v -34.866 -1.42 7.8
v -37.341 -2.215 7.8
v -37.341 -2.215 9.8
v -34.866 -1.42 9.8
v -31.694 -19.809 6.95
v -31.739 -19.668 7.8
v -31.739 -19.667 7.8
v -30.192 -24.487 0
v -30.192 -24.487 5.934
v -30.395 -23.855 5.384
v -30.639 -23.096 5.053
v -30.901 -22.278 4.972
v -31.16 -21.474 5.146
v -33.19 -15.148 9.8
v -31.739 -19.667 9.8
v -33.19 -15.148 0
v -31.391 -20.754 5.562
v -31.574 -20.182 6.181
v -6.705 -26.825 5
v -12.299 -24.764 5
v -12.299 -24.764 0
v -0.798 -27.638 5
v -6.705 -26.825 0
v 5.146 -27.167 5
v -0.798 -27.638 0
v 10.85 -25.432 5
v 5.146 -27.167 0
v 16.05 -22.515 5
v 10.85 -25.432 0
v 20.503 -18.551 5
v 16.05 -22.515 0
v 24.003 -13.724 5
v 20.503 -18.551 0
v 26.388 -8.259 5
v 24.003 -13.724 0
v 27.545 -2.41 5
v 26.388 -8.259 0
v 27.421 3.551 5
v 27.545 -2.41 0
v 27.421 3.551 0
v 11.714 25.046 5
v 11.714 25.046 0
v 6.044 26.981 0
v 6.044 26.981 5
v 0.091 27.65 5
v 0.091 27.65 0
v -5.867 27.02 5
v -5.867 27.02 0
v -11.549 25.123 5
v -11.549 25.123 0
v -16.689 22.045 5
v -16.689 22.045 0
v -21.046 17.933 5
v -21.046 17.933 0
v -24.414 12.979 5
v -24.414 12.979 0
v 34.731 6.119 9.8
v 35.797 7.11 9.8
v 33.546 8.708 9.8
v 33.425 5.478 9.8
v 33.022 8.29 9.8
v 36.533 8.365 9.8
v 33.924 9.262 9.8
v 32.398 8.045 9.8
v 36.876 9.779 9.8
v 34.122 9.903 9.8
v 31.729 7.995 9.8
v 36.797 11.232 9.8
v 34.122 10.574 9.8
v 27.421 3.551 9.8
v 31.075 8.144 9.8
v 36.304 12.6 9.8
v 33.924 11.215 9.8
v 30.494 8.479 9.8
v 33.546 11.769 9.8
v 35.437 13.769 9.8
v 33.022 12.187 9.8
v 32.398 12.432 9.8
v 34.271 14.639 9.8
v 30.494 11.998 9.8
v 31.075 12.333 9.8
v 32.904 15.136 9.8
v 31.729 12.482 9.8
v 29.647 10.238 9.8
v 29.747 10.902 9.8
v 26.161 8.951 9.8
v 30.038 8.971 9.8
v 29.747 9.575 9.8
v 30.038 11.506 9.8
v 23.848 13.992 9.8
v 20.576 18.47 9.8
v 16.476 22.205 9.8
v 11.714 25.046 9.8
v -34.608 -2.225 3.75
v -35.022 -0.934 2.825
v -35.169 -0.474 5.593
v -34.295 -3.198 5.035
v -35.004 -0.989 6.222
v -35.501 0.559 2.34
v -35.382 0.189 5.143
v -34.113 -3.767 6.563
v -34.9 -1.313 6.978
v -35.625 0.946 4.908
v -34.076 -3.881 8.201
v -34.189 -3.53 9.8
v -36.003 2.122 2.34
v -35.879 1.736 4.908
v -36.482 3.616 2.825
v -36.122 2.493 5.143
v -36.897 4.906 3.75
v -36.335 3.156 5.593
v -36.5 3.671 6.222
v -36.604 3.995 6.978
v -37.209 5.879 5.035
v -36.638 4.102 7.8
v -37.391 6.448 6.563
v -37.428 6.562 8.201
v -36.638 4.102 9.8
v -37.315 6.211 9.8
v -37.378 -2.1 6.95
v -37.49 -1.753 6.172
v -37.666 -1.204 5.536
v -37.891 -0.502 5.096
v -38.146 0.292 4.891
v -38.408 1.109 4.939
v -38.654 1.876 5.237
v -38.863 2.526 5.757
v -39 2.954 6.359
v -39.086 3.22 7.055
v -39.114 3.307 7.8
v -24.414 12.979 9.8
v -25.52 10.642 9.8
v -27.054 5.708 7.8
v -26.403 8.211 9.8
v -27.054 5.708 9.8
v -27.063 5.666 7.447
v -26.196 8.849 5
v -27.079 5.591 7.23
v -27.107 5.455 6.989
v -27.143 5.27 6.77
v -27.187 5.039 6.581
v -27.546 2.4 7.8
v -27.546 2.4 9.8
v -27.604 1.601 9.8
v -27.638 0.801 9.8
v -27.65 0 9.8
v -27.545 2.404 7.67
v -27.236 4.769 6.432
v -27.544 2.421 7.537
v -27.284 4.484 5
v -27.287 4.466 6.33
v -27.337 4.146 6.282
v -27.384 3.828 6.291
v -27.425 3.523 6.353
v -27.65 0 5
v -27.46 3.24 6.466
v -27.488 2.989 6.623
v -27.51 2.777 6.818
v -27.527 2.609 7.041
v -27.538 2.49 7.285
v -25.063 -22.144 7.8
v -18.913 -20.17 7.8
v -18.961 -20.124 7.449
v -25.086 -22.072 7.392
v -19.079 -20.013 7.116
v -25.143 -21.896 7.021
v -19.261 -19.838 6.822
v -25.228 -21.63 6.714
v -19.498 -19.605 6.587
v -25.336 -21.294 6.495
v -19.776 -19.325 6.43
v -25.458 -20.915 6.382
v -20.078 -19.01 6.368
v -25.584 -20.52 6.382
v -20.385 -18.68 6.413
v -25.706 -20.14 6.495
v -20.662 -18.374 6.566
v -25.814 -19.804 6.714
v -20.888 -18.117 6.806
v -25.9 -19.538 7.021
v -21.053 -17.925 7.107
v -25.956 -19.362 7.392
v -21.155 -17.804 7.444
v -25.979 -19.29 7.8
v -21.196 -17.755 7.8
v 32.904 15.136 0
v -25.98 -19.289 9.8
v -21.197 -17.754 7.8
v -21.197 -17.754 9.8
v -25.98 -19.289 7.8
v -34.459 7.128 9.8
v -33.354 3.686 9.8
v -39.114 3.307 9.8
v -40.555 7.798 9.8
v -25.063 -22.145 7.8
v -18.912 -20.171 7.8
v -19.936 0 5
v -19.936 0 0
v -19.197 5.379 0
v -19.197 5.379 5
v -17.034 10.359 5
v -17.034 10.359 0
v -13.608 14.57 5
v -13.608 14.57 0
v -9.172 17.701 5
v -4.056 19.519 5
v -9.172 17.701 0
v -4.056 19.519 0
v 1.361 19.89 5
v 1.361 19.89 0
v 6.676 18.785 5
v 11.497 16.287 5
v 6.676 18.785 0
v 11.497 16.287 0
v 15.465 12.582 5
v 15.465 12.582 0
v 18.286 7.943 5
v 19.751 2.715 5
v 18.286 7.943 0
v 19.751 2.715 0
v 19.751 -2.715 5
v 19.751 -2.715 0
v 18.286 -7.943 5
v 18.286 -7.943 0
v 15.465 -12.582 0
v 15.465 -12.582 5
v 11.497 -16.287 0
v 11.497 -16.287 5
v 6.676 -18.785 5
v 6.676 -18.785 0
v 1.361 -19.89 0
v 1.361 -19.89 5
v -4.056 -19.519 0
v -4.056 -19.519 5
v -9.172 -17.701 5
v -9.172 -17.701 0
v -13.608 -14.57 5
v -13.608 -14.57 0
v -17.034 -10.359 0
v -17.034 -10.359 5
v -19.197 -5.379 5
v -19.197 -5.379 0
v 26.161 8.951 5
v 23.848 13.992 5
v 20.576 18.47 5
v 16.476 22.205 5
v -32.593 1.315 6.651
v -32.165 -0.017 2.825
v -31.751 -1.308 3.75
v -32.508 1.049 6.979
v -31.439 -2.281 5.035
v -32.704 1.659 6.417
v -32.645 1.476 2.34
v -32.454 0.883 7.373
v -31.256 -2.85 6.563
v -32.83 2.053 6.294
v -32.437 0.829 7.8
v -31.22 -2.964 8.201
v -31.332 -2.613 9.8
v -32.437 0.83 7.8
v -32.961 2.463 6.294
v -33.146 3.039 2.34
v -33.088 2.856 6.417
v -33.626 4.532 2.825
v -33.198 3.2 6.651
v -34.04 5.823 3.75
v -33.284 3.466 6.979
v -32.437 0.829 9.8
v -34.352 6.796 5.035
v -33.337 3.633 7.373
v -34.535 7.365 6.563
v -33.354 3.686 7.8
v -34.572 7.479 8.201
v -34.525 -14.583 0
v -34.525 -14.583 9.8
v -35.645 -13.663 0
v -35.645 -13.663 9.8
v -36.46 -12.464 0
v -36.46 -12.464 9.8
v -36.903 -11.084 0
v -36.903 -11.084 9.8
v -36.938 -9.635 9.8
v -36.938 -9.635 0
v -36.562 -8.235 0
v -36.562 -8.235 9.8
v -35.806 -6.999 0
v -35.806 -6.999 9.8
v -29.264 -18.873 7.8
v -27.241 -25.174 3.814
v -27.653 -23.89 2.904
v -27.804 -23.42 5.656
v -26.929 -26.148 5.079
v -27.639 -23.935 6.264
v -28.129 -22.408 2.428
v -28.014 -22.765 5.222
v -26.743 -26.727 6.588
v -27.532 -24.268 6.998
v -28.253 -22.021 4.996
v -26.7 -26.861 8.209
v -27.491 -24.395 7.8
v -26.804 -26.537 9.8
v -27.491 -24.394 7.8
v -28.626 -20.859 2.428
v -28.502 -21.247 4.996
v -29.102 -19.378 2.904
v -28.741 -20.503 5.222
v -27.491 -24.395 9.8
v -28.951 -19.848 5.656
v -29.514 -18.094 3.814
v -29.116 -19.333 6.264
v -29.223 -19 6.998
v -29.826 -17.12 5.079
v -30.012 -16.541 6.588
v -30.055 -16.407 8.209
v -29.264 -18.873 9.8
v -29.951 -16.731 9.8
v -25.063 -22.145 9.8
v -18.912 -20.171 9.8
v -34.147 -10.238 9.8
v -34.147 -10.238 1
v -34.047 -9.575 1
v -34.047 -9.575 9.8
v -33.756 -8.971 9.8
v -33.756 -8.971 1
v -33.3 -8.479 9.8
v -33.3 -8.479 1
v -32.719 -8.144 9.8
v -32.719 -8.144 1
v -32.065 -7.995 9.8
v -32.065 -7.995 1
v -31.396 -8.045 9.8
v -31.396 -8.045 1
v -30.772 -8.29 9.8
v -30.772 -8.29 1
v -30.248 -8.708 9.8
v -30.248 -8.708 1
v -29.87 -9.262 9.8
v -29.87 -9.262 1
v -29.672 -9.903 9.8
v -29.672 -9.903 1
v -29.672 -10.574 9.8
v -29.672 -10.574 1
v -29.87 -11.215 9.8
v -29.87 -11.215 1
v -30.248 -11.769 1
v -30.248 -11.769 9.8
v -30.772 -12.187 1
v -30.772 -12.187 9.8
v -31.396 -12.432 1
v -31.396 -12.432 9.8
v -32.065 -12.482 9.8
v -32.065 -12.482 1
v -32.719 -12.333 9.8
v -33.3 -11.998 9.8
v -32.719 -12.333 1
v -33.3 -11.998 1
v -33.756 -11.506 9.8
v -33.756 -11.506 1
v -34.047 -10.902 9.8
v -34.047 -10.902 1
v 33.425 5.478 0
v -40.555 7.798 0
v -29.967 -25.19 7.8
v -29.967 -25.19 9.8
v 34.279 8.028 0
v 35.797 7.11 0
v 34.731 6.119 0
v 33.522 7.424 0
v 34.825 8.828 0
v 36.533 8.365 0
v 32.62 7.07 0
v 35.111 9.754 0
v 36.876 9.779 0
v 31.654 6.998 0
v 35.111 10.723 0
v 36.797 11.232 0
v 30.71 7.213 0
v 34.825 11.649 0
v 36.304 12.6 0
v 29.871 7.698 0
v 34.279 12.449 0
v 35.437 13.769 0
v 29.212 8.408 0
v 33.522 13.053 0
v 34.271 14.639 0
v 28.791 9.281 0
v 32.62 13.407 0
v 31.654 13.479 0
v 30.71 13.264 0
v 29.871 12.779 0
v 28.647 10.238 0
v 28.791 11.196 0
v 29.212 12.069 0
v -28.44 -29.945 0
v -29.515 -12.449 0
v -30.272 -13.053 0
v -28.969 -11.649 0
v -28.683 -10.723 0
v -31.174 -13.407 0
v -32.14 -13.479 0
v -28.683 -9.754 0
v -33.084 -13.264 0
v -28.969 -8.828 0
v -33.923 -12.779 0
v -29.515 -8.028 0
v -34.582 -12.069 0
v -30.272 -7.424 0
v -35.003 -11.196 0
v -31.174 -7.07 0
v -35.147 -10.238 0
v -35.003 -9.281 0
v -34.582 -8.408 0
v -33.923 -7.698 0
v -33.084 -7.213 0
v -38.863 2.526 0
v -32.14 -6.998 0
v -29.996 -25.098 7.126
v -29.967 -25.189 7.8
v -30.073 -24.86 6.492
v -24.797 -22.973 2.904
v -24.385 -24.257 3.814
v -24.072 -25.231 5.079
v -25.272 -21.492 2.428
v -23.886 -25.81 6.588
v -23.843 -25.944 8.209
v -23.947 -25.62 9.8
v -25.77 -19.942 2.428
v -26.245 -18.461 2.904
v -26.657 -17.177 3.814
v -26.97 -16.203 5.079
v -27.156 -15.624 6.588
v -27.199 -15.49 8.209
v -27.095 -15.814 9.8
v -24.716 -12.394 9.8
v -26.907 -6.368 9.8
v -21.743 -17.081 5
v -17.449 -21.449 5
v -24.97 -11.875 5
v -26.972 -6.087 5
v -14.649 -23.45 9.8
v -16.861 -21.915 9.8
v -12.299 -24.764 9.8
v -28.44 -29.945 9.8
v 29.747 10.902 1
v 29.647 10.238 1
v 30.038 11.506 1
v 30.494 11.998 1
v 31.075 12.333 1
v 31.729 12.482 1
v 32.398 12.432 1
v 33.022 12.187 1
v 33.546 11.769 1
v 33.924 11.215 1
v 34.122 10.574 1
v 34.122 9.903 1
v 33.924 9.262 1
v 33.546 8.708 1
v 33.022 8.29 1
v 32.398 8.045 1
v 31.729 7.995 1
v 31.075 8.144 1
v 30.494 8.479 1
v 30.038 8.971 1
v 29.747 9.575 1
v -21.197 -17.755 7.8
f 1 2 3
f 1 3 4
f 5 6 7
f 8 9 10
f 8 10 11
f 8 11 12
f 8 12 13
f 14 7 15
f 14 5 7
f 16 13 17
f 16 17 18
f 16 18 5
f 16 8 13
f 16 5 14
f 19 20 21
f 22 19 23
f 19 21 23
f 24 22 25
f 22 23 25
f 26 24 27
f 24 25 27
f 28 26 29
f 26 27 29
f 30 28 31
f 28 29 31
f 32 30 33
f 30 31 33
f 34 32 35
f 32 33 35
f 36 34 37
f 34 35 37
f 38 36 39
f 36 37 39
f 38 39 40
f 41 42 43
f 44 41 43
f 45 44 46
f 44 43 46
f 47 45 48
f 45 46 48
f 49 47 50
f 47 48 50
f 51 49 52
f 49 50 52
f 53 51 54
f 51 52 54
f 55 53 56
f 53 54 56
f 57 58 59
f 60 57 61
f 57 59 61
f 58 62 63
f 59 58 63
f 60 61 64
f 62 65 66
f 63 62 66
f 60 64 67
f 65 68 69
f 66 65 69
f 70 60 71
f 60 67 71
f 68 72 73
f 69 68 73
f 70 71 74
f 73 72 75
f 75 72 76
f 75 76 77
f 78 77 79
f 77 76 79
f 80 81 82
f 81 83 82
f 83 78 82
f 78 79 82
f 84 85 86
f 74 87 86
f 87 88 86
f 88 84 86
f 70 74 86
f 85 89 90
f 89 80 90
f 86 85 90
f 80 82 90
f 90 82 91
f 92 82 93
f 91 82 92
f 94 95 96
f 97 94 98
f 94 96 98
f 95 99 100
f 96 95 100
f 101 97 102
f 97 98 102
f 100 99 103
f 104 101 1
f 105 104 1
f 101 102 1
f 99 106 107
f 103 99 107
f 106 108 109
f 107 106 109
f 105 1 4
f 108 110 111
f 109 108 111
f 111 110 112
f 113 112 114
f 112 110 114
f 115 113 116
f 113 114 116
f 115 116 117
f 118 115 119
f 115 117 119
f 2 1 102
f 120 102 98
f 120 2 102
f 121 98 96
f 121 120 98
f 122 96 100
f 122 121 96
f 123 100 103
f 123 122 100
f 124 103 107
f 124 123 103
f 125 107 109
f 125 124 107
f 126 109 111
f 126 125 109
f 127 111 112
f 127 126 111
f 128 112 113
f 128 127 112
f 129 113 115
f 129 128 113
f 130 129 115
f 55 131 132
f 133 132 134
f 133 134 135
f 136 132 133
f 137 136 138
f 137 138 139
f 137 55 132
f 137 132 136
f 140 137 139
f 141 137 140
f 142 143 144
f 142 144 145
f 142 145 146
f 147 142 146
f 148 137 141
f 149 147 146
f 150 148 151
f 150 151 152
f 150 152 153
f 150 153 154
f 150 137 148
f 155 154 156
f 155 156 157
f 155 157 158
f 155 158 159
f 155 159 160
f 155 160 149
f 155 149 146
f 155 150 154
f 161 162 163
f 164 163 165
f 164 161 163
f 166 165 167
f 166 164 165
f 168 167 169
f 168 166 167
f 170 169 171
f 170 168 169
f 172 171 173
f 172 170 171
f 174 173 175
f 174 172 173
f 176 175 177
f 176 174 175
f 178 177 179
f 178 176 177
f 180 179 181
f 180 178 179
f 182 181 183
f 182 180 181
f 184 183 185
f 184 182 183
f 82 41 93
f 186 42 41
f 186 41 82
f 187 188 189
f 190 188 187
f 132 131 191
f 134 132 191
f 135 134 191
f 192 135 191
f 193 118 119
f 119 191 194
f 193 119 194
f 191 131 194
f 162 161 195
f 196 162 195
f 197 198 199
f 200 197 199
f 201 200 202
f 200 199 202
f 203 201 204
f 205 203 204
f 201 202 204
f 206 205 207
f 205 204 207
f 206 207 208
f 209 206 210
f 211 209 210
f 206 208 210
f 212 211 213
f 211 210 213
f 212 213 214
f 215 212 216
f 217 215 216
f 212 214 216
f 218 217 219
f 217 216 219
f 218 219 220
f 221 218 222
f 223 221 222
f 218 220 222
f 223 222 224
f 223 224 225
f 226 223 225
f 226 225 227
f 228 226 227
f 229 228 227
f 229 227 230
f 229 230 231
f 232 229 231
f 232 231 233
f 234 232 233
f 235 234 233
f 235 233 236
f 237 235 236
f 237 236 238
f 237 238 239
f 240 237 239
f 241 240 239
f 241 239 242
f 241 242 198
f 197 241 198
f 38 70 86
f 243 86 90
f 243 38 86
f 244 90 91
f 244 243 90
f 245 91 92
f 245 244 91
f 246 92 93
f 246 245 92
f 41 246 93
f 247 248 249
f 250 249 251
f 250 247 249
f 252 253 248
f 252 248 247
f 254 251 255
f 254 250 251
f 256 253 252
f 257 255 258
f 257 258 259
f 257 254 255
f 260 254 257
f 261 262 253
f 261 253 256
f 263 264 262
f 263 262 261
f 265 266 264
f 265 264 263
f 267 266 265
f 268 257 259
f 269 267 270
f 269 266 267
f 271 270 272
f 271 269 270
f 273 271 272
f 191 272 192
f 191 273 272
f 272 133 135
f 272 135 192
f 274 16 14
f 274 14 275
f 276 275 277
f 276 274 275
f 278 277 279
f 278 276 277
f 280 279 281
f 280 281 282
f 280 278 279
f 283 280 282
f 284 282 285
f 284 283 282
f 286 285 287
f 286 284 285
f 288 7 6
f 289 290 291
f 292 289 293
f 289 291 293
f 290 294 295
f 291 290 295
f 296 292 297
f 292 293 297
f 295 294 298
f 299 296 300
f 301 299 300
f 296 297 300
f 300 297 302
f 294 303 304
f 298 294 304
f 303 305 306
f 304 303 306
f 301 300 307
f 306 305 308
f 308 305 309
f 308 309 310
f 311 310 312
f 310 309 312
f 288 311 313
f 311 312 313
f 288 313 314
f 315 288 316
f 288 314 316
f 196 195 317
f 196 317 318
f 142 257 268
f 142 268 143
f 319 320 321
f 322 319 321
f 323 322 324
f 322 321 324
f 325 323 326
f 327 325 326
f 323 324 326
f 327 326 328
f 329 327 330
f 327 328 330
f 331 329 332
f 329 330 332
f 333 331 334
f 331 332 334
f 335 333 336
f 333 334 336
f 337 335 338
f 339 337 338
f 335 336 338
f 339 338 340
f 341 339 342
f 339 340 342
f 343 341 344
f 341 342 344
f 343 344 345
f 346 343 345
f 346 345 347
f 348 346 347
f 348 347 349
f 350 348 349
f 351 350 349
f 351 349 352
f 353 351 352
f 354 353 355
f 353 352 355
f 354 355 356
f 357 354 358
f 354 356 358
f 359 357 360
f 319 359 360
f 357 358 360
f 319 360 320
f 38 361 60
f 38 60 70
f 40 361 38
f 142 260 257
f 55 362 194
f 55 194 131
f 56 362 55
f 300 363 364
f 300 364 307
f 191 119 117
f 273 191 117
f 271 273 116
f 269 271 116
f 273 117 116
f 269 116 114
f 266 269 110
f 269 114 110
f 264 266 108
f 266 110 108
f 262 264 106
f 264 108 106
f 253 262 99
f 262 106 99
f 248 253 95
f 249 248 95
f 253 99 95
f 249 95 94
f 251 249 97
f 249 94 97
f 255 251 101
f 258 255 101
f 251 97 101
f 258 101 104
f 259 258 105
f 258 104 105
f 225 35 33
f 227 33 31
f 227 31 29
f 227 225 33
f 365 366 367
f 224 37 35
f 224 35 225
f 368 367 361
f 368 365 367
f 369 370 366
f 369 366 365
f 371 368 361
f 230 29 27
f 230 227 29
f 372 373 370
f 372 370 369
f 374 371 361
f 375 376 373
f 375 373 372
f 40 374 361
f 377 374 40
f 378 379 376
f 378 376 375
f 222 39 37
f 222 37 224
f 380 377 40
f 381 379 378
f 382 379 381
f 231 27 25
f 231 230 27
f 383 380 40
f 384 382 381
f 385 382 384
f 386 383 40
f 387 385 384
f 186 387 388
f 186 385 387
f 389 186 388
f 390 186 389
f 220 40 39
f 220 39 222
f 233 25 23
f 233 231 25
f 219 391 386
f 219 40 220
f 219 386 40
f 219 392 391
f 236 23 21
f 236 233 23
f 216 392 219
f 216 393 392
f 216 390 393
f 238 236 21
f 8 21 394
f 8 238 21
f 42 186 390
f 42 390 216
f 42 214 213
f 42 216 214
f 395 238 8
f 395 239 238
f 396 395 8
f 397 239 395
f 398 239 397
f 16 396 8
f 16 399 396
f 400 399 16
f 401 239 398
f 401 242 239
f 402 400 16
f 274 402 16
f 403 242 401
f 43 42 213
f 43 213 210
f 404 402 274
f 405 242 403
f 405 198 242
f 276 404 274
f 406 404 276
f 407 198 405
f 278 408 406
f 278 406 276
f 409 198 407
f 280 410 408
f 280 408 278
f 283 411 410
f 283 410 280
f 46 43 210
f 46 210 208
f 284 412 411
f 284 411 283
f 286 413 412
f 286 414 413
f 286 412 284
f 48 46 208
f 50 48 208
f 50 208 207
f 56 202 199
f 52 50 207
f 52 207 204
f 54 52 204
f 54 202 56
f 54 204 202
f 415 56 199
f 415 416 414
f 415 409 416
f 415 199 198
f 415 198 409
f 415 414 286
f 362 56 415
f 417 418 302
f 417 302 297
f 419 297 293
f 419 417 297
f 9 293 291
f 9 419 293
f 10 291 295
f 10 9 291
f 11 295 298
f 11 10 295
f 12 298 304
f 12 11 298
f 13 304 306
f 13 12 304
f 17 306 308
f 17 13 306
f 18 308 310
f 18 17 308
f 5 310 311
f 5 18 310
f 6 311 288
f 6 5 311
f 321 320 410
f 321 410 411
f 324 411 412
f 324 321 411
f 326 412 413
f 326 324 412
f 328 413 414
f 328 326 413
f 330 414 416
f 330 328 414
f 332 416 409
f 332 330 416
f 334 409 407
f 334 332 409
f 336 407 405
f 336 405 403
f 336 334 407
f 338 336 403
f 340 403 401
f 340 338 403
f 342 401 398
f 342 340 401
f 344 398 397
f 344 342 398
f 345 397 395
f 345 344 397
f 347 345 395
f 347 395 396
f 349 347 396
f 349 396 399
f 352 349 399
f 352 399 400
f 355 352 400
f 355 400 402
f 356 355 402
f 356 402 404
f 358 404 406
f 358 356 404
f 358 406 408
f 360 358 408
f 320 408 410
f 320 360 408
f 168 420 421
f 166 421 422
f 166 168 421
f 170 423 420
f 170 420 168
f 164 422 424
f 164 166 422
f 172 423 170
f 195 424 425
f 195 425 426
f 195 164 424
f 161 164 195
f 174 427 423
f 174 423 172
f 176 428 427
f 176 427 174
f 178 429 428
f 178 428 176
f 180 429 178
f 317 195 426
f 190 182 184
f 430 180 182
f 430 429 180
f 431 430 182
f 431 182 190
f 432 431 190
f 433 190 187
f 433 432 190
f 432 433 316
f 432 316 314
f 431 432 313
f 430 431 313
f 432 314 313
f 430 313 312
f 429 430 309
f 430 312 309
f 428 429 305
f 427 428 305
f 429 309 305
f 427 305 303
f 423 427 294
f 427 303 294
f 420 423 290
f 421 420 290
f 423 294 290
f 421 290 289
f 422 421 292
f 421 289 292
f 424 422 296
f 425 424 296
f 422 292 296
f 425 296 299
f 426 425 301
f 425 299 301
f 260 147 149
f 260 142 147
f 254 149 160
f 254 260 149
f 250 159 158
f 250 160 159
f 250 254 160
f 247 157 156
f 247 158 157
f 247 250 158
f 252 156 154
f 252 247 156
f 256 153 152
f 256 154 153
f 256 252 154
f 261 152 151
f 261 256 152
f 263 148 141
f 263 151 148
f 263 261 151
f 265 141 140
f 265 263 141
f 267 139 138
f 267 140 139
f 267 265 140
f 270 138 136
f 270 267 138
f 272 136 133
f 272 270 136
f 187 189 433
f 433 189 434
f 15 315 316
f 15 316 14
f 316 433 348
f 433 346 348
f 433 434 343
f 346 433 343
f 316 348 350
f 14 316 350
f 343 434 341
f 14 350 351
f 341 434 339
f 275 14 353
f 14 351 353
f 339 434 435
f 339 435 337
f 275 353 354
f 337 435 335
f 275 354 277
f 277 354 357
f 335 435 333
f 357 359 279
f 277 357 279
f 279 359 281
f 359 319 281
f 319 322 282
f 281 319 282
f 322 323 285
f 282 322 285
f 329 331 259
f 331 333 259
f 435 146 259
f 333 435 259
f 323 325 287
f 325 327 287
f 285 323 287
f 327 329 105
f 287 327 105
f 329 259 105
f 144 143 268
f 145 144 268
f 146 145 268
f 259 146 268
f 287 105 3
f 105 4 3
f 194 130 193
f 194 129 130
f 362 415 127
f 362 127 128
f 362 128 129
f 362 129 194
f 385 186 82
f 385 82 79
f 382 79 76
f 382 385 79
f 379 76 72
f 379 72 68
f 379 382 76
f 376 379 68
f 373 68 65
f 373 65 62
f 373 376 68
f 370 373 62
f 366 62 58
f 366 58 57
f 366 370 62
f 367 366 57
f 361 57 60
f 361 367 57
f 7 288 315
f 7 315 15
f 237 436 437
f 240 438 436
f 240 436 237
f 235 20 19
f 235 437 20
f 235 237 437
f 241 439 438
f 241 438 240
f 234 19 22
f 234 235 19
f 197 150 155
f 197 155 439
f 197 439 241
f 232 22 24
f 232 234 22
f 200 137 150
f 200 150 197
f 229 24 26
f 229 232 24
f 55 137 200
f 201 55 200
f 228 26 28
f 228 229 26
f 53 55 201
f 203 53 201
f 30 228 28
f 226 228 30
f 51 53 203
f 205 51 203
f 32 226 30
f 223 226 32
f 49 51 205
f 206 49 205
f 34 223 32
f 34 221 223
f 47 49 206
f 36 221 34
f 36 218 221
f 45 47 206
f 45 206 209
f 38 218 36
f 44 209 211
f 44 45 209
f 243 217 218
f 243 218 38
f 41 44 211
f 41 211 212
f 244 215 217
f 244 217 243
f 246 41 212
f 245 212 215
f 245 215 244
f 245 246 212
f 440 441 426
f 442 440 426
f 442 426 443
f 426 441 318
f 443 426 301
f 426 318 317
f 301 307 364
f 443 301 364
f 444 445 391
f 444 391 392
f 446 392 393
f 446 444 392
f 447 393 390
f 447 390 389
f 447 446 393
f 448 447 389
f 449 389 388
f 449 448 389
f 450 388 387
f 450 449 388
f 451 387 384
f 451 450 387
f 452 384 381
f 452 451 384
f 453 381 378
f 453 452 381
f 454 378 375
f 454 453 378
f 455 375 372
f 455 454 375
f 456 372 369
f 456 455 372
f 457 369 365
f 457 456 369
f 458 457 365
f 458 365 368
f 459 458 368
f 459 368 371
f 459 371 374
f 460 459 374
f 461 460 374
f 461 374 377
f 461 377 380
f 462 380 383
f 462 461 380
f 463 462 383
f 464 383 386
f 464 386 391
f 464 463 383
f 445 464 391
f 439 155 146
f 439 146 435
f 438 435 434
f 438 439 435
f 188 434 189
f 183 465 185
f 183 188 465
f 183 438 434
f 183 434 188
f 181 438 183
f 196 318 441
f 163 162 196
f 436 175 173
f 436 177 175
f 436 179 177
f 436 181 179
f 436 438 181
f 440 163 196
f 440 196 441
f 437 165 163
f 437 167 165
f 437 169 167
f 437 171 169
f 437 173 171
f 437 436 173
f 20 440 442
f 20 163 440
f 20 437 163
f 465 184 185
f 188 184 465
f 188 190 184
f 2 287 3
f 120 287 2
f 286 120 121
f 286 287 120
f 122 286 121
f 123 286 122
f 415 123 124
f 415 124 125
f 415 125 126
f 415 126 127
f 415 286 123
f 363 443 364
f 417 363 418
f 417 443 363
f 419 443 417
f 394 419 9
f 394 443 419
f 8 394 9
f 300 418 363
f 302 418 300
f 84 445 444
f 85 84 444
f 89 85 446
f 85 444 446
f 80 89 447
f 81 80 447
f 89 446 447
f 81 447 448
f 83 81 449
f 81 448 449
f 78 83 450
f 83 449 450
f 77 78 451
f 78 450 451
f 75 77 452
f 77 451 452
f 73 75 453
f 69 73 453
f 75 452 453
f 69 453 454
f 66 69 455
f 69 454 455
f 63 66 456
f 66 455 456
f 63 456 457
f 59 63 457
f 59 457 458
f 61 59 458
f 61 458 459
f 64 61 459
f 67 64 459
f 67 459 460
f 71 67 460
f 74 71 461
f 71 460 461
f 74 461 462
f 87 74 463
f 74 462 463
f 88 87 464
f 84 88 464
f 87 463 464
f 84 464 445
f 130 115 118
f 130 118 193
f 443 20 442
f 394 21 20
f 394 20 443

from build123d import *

# Parameters (mm, degrees)
CROQUIS1_R              = 27.65
SALIENTE_EXTRUIR1_DEPTH = 5
CROQUIS2_R              = 2.25
SALIENTE_EXTRUIR2_DEPTH = 9.8
CROQUIS8_R              = 19.936300619
CORTAR_EXTRUIR8_DEPTH   = 52.356476321
CHAFL_N1_SIZE           = 1
CROQUIS14_R             = 2.9
CORTAR_EXTRUIR15_DEPTH  = 3
CROQUIS15_R             = 5.5
CORTAR_EXTRUIR16_DEPTH  = 3
CROQUIS16_R             = 1.5
CORTAR_EXTRUIR17_DEPTH  = 25
CROQUIS18_R             = 2.9
CORTAR_EXTRUIR18_DEPTH  = 3
CROQUIS19_R             = 5.5
CORTAR_EXTRUIR19_DEPTH  = 3
CROQUIS20_R             = 1.5
CORTAR_EXTRUIR20_DEPTH  = 22
CORTAR_EXTRUIR21_START  = -2
CORTAR_EXTRUIR21_DEPTH  = 2


with BuildPart() as part:
    # Croquis1 → Saliente-Extruir1 (new body)
    with BuildSketch(Plane.XY):
        Circle(CROQUIS1_R)
    extrude(amount=SALIENTE_EXTRUIR1_DEPTH)

    # Croquis2 → Saliente-Extruir2 (add)
    # profile 1 of 2: a face of its own
    with BuildSketch(Plane(origin=(0, 0, 0), x_dir=(-1, 0, 0), z_dir=(0, 0, -1))):
        with BuildLine():
            ThreePointArc((-32.903550176, 15.136150236), (-36.88979451, 10.508157001), (-33.425205403, 5.477740757))
            Line((-33.425205403, 5.477740757), (-27.421093943, 3.550507988))
            ThreePointArc((-27.421093943, 3.550507988), (-22.324820018, 16.313335379), (-11.713593891, 25.046241598))
            Line((-11.713593891, 25.046241598), (-32.903550176, 15.136150236))
        make_face()
        with Locations((-31.89707142, 10.238497685)):
            Circle(CROQUIS2_R, mode=Mode.SUBTRACT)
    # profile 2 of 2: a face of its own
    with BuildSketch(Plane(origin=(0, 0, 0), x_dir=(-1, 0, 0), z_dir=(0, 0, -1))):
        with BuildLine():
            ThreePointArc((27.65, 0), (23.501050206, -14.567880396), (12.299320852, -24.763868974))
            Line((12.299320852, -24.763868974), (28.440475678, -29.944945762))
            Line((28.440475678, -29.944945762), (30.192362506, -24.487108002))
            Line((30.192362506, -24.487108002), (33.190053815, -15.148084182))
            ThreePointArc((33.190053815, -15.148084182), (36.731135944, -11.790162344), (35.805913272, -6.998621389))
            Line((35.805913272, -6.998621389), (38.863217361, 2.52612041))
            Line((38.863217361, 2.52612041), (40.555491409, 7.798240191))
            Line((40.555491409, 7.798240191), (24.414336583, 12.979316979))
            ThreePointArc((24.414336583, 12.979316979), (26.828892136, 6.688276814), (27.65, 0))
        make_face()
        with Locations((31.89707142, -10.238497685)):
            Circle(CROQUIS2_R, mode=Mode.SUBTRACT)
    extrude(amount=-SALIENTE_EXTRUIR2_DEPTH)

    # Croquis8 → Cortar-Extruir8 (cut, through all)
    with BuildSketch(Plane(origin=(0, 0, 0), x_dir=(-1, 0, 0), z_dir=(0, 0, -1))):
        Circle(CROQUIS8_R)
    extrude(amount=-CORTAR_EXTRUIR8_DEPTH, mode=Mode.SUBTRACT)

    # Chaflán1
    chafl_n1_edges = [part.edges().sort_by_distance(p)[0] for p in [
        (-29.64707142, -10.238497685, 0),
        (34.14707142, 10.238497685, 0),
    ]]
    chamfer(chafl_n1_edges, length=CHAFL_N1_SIZE)

    # Croquis14 → Cortar-Extruir15 (cut)
    with BuildSketch(Plane(origin=(-34.497983543, -11.073352785, 0), x_dir=(0, 0, -1), z_dir=(0.9521513856630914, 0.30562679656707925, 0))):
        with Locations((-7.77864737, 12.203434568)):
            Circle(CROQUIS14_R)
    extrude(amount=CORTAR_EXTRUIR15_DEPTH, mode=Mode.SUBTRACT)

    # Croquis15 → Cortar-Extruir16 (cut)
    with BuildSketch(Plane(origin=(-32.022389941, -10.278723114, 0), x_dir=(0, 0, 1), z_dir=(-0.9521513856630914, -0.30562679656707925, 0))):
        with Locations((7.77864737, 12.203434568)):
            Circle(CROQUIS15_R)
    extrude(amount=-CORTAR_EXTRUIR16_DEPTH, mode=Mode.SUBTRACT)

    # Croquis16 → Cortar-Extruir17 (cut)
    with BuildSketch(Plane(origin=(-29.546796338, -9.484093443, 0), x_dir=(0, 0, -1), z_dir=(0.9521513856630914, 0.30562679656707925, 0))):
        with Locations(Location((-7.77864737, 12.203434568, 0), (0, 0, 270))):
            Circle(CROQUIS16_R)
    extrude(amount=CORTAR_EXTRUIR17_DEPTH, mode=Mode.SUBTRACT)

    # Croquis18 → Cortar-Extruir18 (cut)
    with BuildSketch(Plane(origin=(-34.497983543, -11.073352785, 0), x_dir=(0, 0, -1), z_dir=(0.9521513856630915, 0.30562679656707936, 0))):
        with Locations((-7.867235226, -11.925798003)):
            Circle(CROQUIS18_R)
    extrude(amount=CORTAR_EXTRUIR18_DEPTH, mode=Mode.SUBTRACT)

    # Croquis19 → Cortar-Extruir19 (cut)
    with BuildSketch(Plane(origin=(-32.022389941, -10.278723114, 0), x_dir=(0, 0, 1), z_dir=(-0.9521513856630915, -0.30562679656707936, 0))):
        with Locations((7.867235226, -11.925798003)):
            Circle(CROQUIS19_R)
    extrude(amount=-CORTAR_EXTRUIR19_DEPTH, mode=Mode.SUBTRACT)

    # Croquis20 → Cortar-Extruir20 (cut)
    with BuildSketch(Plane(origin=(-29.546796338, -9.484093443, 0), x_dir=(0, 0, -1), z_dir=(0.9521513856630915, 0.30562679656707936, 0))):
        with Locations(Location((-7.867235226, -11.925798003, 0), (0, 0, 270))):
            Circle(CROQUIS20_R)
    extrude(amount=CORTAR_EXTRUIR20_DEPTH, mode=Mode.SUBTRACT)

    # Croquis21 → Cortar-Extruir21 (cut)
    with BuildSketch(Plane.XY.offset(9.8).offset(CORTAR_EXTRUIR21_START)):
        with BuildLine():
            Line((-25.979532538, -19.288780739), (-25.062652149, -22.145234896))
            Line((-25.062652149, -22.145234896), (-18.911821549, -20.170907409))
            ThreePointArc((-18.911821549, -20.170907409), (-20.090955919, -18.996736306), (-21.19732255, -17.753760635))
            Line((-21.19732255, -17.753760635), (-25.979532538, -19.288780739))
        make_face()
        with BuildLine():
            Line((-33.354072593, 3.685901488), (-32.437192203, 0.829447331))
            Line((-32.437192203, 0.829447331), (-27.545683066, 2.399550877))
            ThreePointArc((-27.545683066, 2.399550877), (-27.350119986, 4.061211244), (-27.05441226, 5.708001162))
            Line((-27.05441226, 5.708001162), (-33.354072593, 3.685901488))
        make_face()
        Polygon((-39.113997867, 3.307403367), (-37.341362447, -2.21507467), (-34.865768845, -1.420444999), (-36.638404265, 4.102033038), align=None)
        Polygon((-31.739457813, -19.66727886), (-29.966822393, -25.189756897), (-27.491228791, -24.395127226), (-29.263864211, -18.872649189), align=None)
    extrude(amount=CORTAR_EXTRUIR21_DEPTH, mode=Mode.SUBTRACT)


solid = part.part
